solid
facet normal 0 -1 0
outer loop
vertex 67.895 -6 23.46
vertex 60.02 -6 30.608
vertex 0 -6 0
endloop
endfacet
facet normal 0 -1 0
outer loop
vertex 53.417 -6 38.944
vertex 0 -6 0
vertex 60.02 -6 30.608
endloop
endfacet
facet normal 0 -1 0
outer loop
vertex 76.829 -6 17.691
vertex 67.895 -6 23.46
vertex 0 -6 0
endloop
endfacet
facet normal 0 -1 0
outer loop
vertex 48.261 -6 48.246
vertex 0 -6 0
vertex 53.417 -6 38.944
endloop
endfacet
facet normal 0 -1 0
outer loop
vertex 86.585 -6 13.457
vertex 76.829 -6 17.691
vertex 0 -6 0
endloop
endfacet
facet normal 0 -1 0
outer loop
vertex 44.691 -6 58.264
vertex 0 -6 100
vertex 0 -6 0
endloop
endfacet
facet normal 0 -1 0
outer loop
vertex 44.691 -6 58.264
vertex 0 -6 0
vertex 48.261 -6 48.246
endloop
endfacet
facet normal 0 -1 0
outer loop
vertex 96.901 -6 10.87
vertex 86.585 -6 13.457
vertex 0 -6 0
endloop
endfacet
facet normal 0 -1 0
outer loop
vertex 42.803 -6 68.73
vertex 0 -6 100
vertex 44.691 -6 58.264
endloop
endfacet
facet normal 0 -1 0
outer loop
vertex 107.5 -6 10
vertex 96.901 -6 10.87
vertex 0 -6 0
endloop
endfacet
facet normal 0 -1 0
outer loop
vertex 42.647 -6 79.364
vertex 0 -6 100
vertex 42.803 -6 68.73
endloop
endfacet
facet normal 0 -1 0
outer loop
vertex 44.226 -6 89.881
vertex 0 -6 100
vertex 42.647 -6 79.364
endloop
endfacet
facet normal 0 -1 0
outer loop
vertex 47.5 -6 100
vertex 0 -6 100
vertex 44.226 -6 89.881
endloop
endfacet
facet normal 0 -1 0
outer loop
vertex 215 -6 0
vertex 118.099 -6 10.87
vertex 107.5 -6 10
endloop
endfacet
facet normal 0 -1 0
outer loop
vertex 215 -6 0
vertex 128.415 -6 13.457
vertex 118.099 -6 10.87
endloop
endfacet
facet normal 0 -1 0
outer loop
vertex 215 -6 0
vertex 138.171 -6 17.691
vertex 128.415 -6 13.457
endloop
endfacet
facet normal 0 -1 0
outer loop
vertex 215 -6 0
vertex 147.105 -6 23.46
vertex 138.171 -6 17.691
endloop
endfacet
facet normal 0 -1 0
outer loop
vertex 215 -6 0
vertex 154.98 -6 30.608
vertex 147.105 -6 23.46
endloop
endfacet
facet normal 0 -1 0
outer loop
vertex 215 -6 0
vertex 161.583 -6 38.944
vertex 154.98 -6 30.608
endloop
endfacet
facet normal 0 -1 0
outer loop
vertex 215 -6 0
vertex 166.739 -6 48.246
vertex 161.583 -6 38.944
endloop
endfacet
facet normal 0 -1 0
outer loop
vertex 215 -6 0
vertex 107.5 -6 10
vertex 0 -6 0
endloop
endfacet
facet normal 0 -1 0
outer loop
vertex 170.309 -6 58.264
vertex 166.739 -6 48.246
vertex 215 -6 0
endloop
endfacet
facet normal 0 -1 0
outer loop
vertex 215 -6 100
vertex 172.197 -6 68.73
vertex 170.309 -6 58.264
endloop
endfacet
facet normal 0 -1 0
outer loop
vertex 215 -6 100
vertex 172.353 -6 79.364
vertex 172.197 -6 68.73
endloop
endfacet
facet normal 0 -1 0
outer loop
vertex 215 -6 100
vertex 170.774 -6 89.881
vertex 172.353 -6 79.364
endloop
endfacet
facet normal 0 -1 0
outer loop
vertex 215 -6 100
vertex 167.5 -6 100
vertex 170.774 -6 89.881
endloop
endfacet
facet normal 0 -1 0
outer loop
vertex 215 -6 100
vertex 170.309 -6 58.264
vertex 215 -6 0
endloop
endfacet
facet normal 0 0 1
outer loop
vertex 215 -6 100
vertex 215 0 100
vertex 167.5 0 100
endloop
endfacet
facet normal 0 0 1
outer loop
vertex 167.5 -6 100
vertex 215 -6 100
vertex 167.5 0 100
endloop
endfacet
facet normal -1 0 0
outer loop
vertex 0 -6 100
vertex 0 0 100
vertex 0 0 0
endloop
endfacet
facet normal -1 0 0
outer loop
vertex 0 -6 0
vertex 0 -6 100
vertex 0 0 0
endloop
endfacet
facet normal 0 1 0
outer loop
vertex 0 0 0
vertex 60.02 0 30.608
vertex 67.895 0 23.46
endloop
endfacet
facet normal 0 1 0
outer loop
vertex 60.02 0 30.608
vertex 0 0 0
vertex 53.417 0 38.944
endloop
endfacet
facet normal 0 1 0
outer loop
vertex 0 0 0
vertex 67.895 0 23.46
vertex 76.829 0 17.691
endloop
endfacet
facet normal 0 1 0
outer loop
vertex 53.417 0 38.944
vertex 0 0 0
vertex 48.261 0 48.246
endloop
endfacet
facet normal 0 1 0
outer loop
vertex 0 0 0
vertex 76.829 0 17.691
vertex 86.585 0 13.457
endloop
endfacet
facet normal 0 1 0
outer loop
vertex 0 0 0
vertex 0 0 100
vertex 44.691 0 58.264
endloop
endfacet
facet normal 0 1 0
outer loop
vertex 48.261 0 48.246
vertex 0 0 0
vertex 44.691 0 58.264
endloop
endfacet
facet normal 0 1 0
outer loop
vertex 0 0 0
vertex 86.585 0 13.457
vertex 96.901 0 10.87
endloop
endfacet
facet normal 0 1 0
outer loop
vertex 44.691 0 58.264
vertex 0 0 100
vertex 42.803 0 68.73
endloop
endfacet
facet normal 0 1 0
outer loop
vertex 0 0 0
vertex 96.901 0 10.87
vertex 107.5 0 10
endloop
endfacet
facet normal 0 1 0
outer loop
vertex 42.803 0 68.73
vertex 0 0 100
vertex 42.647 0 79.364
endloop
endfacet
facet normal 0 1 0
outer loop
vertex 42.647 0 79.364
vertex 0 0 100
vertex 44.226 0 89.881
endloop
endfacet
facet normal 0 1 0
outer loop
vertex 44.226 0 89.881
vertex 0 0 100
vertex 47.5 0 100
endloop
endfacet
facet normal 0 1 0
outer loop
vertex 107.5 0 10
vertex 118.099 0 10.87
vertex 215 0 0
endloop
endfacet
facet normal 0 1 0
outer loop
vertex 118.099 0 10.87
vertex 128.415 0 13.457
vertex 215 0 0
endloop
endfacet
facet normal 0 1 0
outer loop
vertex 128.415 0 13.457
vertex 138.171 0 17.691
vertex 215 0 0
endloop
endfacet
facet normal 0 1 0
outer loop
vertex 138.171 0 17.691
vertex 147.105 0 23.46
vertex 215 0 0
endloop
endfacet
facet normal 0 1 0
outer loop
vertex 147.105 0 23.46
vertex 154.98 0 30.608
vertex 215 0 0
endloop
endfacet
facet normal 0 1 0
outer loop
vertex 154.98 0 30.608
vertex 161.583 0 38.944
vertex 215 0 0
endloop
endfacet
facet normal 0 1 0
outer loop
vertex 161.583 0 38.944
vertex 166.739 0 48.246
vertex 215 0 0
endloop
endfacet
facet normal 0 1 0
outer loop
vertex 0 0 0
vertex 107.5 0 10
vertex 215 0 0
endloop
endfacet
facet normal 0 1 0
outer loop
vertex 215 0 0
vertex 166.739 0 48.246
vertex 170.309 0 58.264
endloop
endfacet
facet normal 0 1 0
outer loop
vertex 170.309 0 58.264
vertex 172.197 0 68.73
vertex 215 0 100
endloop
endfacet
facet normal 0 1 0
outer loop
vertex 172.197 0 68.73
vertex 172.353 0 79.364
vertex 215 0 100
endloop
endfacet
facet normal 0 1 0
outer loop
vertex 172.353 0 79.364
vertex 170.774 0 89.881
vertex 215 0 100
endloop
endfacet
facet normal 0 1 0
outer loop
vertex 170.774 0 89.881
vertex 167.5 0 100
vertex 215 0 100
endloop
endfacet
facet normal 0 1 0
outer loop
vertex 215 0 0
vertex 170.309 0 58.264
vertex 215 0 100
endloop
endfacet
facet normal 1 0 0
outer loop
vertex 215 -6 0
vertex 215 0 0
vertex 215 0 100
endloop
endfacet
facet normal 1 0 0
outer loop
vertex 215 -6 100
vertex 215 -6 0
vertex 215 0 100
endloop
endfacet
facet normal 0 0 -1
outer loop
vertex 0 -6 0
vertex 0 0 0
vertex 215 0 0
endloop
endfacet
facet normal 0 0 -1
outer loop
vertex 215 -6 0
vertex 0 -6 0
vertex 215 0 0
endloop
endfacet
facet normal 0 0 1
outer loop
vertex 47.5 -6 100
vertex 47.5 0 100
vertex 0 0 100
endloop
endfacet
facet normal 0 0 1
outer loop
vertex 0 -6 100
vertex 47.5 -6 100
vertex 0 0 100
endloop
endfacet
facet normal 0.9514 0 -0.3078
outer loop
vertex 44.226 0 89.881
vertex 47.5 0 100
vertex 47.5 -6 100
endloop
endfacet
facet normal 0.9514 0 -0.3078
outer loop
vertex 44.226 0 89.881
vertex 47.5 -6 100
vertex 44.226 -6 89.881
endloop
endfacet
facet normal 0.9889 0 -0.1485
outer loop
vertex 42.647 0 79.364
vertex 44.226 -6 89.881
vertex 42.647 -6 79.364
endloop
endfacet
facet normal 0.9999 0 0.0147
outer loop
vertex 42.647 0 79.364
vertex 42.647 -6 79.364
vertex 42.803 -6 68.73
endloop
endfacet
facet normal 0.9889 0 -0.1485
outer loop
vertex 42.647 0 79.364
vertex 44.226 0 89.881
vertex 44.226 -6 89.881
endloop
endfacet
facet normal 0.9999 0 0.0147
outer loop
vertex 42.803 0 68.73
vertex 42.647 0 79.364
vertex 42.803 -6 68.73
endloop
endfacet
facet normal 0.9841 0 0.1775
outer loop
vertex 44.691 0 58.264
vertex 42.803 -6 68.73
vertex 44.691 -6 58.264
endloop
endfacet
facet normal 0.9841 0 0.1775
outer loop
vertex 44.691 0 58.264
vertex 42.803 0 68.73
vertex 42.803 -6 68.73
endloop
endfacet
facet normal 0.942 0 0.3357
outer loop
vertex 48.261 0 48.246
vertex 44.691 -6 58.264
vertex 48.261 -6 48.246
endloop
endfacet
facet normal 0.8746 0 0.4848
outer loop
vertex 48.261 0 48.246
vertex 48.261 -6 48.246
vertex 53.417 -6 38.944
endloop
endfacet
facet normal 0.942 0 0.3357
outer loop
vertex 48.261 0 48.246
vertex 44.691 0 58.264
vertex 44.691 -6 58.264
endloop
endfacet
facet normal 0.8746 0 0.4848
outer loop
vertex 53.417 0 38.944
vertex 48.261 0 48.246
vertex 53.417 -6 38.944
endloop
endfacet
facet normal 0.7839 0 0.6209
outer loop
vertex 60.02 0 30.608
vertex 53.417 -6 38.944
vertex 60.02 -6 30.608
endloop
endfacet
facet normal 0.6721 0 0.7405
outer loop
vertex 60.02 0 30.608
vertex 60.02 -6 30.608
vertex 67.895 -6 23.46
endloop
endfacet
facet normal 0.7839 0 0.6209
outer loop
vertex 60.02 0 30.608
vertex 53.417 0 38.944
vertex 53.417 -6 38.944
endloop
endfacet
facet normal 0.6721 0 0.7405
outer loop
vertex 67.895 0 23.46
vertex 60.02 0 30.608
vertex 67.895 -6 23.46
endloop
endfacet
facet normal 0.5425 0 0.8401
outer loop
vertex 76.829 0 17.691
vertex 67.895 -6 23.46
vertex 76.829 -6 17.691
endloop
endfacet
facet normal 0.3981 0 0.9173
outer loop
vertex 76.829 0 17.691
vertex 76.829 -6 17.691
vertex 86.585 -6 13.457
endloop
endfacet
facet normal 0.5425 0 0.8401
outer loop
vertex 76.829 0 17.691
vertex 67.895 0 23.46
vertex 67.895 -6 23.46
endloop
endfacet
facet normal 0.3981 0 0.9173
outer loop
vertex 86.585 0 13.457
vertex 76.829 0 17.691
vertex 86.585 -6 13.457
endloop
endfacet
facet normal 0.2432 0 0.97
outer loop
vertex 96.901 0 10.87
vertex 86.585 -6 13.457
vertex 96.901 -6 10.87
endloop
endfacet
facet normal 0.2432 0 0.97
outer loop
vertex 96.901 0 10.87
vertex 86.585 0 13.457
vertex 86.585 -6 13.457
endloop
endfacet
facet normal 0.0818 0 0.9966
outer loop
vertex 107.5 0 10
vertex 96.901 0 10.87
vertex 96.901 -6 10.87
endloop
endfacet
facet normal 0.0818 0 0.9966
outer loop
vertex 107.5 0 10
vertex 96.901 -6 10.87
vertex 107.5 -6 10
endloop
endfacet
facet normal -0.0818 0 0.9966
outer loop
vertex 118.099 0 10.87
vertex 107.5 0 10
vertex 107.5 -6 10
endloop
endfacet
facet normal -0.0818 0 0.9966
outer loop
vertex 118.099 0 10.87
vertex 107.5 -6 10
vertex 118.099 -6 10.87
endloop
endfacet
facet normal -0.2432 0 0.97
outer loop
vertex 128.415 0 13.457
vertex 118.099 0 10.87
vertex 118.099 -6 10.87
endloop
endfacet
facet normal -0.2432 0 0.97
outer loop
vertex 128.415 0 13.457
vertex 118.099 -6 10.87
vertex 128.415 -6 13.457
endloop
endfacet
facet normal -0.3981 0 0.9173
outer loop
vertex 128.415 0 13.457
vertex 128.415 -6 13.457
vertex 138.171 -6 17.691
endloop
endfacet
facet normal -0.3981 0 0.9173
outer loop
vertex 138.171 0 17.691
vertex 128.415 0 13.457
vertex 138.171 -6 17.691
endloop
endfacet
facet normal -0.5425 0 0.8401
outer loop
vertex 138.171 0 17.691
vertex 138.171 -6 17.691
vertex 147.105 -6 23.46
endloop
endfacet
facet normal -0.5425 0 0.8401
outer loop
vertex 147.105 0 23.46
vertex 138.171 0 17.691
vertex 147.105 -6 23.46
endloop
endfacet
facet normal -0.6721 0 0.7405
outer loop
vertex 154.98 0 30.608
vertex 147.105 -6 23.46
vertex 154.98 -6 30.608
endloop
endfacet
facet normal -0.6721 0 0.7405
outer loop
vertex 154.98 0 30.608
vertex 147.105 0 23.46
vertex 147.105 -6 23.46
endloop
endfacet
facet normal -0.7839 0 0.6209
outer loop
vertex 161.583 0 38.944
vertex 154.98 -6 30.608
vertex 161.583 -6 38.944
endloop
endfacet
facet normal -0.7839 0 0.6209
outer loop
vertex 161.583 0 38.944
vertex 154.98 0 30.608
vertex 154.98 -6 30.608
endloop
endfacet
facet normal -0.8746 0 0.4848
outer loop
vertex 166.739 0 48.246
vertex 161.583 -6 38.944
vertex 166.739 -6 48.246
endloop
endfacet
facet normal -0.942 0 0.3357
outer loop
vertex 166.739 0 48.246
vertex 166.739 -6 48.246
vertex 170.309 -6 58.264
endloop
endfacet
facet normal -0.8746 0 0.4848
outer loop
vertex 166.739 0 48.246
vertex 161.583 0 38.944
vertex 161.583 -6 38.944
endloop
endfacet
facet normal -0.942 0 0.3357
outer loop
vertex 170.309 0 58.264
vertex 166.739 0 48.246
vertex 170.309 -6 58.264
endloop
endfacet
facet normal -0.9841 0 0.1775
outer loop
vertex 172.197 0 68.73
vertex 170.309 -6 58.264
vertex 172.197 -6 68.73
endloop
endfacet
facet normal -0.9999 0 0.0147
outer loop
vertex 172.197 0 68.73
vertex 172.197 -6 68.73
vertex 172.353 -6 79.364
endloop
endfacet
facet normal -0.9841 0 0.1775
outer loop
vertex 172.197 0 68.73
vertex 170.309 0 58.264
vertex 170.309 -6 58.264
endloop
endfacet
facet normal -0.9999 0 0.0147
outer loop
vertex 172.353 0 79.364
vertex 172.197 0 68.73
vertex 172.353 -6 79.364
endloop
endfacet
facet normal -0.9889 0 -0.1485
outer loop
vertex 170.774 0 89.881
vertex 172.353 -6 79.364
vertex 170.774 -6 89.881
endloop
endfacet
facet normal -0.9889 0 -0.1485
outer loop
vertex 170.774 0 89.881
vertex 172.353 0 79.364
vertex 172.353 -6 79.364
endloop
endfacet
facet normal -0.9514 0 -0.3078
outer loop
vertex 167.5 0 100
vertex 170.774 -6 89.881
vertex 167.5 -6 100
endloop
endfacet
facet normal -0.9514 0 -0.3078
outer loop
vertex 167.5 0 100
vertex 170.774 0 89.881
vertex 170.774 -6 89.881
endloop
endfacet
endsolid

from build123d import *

# Parameters (mm, degrees)
PAD_DEPTH = 6


with BuildPart() as part:
    # Sketch → Pad (new body)
    with BuildSketch(Plane.XZ):
        with BuildLine():
            Line((0, 0), (215, 0))
            Line((215, 0), (215, 100))
            Line((215, 100), (167.5, 100))
            ThreePointArc((47.5, 100), (107.5, 10), (167.5, 100))
            Line((47.5, 100), (0, 100))
            Line((0, 100), (0, 0))
        make_face()
    extrude(amount=PAD_DEPTH)


solid = part.part
